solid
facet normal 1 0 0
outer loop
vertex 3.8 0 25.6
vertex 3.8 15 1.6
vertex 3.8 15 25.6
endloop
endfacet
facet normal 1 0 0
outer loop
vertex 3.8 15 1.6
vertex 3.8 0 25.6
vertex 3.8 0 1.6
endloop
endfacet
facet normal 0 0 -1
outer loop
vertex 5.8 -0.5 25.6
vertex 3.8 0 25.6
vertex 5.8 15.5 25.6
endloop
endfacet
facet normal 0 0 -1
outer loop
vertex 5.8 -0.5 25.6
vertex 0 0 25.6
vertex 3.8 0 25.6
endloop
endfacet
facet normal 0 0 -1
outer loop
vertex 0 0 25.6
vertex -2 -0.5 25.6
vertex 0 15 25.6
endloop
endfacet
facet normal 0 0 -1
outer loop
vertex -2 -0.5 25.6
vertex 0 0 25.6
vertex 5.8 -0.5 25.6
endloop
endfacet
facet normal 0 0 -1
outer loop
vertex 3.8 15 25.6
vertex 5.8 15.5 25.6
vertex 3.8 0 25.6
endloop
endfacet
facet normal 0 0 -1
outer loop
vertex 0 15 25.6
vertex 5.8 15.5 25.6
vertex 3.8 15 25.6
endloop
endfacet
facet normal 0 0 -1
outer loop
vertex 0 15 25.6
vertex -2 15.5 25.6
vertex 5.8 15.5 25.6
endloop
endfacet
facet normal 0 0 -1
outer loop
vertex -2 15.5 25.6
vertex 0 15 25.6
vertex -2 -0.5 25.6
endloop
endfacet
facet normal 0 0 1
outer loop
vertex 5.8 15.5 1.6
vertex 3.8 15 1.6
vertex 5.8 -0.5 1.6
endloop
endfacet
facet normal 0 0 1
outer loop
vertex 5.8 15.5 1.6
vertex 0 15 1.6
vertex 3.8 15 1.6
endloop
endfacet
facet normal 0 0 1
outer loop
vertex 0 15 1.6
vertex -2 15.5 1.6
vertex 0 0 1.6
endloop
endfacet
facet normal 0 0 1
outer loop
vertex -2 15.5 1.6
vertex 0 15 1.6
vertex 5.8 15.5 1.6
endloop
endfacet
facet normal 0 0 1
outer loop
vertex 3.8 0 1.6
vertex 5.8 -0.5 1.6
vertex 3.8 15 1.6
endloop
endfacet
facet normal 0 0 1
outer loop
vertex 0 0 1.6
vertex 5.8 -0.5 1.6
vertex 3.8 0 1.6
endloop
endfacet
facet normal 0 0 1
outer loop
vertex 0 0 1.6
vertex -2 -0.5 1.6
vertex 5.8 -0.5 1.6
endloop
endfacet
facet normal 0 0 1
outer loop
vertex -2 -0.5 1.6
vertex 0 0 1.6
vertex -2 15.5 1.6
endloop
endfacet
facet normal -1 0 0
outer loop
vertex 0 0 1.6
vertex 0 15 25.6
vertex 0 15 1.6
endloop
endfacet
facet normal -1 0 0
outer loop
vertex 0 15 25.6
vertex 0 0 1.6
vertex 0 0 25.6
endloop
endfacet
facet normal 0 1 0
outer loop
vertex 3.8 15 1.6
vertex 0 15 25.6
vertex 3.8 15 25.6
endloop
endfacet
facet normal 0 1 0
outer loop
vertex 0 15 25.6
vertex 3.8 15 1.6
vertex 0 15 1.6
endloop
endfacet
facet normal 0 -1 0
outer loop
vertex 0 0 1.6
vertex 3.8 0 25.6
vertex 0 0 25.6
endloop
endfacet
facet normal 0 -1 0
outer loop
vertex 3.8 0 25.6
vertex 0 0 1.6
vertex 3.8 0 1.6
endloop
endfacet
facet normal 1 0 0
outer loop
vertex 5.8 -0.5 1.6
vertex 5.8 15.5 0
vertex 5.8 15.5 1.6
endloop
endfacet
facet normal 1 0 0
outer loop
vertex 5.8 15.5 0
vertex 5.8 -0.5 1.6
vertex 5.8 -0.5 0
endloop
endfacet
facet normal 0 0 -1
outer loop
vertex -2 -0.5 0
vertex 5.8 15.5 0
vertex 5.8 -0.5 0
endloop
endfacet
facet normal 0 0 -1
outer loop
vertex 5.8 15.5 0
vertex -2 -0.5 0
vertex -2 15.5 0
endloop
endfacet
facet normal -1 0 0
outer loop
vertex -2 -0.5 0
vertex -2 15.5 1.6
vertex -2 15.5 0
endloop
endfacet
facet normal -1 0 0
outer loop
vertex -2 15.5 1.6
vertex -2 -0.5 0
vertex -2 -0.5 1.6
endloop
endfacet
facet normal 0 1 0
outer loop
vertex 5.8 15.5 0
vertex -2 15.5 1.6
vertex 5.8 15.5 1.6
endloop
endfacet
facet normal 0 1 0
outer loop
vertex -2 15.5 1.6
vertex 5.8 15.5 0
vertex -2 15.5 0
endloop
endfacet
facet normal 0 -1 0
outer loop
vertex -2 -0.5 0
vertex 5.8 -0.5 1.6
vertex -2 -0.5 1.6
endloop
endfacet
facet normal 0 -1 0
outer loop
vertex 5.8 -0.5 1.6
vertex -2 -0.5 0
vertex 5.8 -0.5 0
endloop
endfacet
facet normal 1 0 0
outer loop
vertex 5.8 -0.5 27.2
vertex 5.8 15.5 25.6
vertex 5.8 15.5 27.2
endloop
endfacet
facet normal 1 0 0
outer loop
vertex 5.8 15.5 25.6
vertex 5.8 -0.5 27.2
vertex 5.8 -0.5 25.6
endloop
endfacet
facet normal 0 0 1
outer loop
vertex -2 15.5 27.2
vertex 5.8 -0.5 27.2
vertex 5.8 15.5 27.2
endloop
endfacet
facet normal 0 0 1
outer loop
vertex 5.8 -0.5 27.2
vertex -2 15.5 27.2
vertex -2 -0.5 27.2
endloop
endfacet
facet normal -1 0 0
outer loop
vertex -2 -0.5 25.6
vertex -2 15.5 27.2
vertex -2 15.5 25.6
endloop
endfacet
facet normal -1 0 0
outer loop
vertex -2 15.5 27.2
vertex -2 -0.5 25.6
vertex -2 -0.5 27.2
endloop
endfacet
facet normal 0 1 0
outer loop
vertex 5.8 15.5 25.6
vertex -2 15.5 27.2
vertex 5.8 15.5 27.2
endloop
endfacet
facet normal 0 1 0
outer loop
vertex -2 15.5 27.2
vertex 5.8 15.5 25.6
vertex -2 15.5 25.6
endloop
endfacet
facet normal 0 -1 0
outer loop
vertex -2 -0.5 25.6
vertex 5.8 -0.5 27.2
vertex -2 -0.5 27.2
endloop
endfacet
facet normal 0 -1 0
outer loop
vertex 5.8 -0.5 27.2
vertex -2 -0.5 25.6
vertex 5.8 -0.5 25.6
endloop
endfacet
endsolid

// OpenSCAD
// Gen-G radial bobbin — 12 needed; 26 AWG preferred
body_w = 11.0; body_d = 16.0; body_h = 24.0;
flange_t = 1.6; flange_overhang = 2.0; core_w = 3.8;
$fn = 48;
translate([0, 0, flange_t]) cube([core_w, body_d - 1, body_h]);
translate([-flange_overhang, -0.5, 0]) cube([core_w + 2*flange_overhang, body_d, flange_t]);
translate([-flange_overhang, -0.5, flange_t + body_h]) cube([core_w + 2*flange_overhang, body_d, flange_t]);
